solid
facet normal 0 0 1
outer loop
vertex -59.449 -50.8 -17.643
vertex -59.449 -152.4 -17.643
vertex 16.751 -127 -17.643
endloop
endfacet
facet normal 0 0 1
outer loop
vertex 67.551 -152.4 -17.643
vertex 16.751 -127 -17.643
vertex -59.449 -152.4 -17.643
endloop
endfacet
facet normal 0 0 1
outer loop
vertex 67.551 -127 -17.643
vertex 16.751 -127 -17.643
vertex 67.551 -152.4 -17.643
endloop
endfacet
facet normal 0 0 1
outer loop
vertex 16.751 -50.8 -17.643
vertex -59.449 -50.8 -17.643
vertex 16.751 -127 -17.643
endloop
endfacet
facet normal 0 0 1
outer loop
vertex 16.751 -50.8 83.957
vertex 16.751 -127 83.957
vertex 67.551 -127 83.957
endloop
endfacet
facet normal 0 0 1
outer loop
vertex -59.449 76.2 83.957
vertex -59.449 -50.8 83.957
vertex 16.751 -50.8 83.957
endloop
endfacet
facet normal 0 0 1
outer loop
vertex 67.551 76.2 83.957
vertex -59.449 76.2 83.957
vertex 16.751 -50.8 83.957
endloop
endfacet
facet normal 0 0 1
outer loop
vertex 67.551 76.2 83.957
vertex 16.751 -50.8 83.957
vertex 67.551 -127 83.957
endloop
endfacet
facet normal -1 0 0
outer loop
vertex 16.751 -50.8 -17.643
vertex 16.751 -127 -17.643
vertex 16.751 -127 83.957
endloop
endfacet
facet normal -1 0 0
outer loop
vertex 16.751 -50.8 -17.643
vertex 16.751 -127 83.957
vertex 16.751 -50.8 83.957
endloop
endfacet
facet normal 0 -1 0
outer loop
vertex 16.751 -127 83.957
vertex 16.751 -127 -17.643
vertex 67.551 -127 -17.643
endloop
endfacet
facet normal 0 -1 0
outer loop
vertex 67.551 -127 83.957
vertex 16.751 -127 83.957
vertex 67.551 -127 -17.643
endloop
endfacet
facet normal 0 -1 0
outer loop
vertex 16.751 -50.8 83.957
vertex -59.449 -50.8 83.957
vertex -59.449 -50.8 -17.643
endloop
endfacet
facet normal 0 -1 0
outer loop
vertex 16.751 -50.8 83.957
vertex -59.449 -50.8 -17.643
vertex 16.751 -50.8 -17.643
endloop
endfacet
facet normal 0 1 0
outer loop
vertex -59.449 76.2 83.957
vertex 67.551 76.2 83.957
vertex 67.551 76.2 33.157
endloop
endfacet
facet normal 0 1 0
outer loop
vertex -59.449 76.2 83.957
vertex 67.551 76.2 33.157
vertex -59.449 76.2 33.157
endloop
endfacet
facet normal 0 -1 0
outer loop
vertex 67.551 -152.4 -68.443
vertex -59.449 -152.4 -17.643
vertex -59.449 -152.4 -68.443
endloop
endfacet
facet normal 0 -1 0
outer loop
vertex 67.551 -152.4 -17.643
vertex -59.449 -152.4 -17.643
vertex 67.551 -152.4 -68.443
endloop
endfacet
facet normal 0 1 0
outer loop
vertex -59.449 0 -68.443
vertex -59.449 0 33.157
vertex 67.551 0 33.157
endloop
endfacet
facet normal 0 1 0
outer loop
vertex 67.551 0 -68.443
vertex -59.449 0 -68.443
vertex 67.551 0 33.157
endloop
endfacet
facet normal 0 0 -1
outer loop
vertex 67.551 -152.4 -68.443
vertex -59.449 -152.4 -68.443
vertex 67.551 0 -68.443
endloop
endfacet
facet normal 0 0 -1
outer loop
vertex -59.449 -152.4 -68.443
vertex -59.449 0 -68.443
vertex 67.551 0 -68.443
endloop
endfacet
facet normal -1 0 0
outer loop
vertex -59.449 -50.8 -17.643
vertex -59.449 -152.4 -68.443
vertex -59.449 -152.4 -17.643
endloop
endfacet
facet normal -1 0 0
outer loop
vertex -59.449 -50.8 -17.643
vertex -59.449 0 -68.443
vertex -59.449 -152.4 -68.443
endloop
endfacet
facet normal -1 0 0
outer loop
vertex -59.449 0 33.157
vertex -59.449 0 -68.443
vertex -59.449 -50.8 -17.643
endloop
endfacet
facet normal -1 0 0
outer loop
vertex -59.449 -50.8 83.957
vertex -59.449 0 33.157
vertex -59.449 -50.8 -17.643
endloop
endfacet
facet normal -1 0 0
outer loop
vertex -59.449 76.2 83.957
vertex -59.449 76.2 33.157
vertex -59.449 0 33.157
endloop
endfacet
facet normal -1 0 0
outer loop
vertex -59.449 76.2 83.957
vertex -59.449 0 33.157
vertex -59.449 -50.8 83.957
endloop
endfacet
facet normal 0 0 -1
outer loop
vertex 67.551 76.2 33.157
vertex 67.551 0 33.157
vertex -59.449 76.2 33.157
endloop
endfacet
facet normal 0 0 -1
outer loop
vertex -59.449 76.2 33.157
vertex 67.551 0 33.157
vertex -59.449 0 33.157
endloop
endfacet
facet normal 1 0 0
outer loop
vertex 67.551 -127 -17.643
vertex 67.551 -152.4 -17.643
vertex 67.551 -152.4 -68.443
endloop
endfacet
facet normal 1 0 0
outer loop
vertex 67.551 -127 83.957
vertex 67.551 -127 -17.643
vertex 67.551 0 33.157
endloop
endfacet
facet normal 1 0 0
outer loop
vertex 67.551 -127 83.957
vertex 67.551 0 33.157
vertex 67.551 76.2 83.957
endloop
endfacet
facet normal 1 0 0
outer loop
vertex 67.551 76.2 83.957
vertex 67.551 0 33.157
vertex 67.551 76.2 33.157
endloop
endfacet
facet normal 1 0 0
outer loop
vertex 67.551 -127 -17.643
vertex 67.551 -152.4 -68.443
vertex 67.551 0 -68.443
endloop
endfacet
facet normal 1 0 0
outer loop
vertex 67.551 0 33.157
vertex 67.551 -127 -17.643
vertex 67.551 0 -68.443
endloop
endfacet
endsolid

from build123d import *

# Parameters (mm, degrees)
F0_W     = 127
F0_H     = 152.4
F1_DEPTH = 50.8
F2_W     = 127
F2_H     = 50.8
F3_DEPTH = 76.2
F4_W     = 127
F4_H     = 50.8
F5_DEPTH = 101.6
F6_W     = 50.8
F6_H     = 76.2
F7_DEPTH = 101.6


with BuildPart() as f1:
    # F0 (on Front) → F1 (new body)
    with BuildSketch(Plane.XZ):
        with Locations((4.05114, 7.757214)):
            Rectangle(F0_W, F0_H)
    extrude(amount=F1_DEPTH)

    # F2 (on face) → F3 (join)
    with BuildSketch(Plane(origin=(0, 0, 0), x_dir=(-1, 0, 0), z_dir=(0, 1, 0))):
        with Locations((-4.05114, 58.557214)):
            Rectangle(F2_W, F2_H)
    extrude(amount=F3_DEPTH)

    # F4 (on face) → F5 (join)
    with BuildSketch(Plane.XZ.offset(50.8)):
        with Locations((4.05114, -43.042786)):
            Rectangle(F4_W, F4_H)
    extrude(amount=F5_DEPTH)

    # F6 (on face) → F7 (join)
    with BuildSketch(Plane.XY.offset(-17.642786)):
        with Locations((42.15114, -88.9)):
            Rectangle(F6_W, F6_H)
    extrude(amount=F7_DEPTH)


solid = f1.part
